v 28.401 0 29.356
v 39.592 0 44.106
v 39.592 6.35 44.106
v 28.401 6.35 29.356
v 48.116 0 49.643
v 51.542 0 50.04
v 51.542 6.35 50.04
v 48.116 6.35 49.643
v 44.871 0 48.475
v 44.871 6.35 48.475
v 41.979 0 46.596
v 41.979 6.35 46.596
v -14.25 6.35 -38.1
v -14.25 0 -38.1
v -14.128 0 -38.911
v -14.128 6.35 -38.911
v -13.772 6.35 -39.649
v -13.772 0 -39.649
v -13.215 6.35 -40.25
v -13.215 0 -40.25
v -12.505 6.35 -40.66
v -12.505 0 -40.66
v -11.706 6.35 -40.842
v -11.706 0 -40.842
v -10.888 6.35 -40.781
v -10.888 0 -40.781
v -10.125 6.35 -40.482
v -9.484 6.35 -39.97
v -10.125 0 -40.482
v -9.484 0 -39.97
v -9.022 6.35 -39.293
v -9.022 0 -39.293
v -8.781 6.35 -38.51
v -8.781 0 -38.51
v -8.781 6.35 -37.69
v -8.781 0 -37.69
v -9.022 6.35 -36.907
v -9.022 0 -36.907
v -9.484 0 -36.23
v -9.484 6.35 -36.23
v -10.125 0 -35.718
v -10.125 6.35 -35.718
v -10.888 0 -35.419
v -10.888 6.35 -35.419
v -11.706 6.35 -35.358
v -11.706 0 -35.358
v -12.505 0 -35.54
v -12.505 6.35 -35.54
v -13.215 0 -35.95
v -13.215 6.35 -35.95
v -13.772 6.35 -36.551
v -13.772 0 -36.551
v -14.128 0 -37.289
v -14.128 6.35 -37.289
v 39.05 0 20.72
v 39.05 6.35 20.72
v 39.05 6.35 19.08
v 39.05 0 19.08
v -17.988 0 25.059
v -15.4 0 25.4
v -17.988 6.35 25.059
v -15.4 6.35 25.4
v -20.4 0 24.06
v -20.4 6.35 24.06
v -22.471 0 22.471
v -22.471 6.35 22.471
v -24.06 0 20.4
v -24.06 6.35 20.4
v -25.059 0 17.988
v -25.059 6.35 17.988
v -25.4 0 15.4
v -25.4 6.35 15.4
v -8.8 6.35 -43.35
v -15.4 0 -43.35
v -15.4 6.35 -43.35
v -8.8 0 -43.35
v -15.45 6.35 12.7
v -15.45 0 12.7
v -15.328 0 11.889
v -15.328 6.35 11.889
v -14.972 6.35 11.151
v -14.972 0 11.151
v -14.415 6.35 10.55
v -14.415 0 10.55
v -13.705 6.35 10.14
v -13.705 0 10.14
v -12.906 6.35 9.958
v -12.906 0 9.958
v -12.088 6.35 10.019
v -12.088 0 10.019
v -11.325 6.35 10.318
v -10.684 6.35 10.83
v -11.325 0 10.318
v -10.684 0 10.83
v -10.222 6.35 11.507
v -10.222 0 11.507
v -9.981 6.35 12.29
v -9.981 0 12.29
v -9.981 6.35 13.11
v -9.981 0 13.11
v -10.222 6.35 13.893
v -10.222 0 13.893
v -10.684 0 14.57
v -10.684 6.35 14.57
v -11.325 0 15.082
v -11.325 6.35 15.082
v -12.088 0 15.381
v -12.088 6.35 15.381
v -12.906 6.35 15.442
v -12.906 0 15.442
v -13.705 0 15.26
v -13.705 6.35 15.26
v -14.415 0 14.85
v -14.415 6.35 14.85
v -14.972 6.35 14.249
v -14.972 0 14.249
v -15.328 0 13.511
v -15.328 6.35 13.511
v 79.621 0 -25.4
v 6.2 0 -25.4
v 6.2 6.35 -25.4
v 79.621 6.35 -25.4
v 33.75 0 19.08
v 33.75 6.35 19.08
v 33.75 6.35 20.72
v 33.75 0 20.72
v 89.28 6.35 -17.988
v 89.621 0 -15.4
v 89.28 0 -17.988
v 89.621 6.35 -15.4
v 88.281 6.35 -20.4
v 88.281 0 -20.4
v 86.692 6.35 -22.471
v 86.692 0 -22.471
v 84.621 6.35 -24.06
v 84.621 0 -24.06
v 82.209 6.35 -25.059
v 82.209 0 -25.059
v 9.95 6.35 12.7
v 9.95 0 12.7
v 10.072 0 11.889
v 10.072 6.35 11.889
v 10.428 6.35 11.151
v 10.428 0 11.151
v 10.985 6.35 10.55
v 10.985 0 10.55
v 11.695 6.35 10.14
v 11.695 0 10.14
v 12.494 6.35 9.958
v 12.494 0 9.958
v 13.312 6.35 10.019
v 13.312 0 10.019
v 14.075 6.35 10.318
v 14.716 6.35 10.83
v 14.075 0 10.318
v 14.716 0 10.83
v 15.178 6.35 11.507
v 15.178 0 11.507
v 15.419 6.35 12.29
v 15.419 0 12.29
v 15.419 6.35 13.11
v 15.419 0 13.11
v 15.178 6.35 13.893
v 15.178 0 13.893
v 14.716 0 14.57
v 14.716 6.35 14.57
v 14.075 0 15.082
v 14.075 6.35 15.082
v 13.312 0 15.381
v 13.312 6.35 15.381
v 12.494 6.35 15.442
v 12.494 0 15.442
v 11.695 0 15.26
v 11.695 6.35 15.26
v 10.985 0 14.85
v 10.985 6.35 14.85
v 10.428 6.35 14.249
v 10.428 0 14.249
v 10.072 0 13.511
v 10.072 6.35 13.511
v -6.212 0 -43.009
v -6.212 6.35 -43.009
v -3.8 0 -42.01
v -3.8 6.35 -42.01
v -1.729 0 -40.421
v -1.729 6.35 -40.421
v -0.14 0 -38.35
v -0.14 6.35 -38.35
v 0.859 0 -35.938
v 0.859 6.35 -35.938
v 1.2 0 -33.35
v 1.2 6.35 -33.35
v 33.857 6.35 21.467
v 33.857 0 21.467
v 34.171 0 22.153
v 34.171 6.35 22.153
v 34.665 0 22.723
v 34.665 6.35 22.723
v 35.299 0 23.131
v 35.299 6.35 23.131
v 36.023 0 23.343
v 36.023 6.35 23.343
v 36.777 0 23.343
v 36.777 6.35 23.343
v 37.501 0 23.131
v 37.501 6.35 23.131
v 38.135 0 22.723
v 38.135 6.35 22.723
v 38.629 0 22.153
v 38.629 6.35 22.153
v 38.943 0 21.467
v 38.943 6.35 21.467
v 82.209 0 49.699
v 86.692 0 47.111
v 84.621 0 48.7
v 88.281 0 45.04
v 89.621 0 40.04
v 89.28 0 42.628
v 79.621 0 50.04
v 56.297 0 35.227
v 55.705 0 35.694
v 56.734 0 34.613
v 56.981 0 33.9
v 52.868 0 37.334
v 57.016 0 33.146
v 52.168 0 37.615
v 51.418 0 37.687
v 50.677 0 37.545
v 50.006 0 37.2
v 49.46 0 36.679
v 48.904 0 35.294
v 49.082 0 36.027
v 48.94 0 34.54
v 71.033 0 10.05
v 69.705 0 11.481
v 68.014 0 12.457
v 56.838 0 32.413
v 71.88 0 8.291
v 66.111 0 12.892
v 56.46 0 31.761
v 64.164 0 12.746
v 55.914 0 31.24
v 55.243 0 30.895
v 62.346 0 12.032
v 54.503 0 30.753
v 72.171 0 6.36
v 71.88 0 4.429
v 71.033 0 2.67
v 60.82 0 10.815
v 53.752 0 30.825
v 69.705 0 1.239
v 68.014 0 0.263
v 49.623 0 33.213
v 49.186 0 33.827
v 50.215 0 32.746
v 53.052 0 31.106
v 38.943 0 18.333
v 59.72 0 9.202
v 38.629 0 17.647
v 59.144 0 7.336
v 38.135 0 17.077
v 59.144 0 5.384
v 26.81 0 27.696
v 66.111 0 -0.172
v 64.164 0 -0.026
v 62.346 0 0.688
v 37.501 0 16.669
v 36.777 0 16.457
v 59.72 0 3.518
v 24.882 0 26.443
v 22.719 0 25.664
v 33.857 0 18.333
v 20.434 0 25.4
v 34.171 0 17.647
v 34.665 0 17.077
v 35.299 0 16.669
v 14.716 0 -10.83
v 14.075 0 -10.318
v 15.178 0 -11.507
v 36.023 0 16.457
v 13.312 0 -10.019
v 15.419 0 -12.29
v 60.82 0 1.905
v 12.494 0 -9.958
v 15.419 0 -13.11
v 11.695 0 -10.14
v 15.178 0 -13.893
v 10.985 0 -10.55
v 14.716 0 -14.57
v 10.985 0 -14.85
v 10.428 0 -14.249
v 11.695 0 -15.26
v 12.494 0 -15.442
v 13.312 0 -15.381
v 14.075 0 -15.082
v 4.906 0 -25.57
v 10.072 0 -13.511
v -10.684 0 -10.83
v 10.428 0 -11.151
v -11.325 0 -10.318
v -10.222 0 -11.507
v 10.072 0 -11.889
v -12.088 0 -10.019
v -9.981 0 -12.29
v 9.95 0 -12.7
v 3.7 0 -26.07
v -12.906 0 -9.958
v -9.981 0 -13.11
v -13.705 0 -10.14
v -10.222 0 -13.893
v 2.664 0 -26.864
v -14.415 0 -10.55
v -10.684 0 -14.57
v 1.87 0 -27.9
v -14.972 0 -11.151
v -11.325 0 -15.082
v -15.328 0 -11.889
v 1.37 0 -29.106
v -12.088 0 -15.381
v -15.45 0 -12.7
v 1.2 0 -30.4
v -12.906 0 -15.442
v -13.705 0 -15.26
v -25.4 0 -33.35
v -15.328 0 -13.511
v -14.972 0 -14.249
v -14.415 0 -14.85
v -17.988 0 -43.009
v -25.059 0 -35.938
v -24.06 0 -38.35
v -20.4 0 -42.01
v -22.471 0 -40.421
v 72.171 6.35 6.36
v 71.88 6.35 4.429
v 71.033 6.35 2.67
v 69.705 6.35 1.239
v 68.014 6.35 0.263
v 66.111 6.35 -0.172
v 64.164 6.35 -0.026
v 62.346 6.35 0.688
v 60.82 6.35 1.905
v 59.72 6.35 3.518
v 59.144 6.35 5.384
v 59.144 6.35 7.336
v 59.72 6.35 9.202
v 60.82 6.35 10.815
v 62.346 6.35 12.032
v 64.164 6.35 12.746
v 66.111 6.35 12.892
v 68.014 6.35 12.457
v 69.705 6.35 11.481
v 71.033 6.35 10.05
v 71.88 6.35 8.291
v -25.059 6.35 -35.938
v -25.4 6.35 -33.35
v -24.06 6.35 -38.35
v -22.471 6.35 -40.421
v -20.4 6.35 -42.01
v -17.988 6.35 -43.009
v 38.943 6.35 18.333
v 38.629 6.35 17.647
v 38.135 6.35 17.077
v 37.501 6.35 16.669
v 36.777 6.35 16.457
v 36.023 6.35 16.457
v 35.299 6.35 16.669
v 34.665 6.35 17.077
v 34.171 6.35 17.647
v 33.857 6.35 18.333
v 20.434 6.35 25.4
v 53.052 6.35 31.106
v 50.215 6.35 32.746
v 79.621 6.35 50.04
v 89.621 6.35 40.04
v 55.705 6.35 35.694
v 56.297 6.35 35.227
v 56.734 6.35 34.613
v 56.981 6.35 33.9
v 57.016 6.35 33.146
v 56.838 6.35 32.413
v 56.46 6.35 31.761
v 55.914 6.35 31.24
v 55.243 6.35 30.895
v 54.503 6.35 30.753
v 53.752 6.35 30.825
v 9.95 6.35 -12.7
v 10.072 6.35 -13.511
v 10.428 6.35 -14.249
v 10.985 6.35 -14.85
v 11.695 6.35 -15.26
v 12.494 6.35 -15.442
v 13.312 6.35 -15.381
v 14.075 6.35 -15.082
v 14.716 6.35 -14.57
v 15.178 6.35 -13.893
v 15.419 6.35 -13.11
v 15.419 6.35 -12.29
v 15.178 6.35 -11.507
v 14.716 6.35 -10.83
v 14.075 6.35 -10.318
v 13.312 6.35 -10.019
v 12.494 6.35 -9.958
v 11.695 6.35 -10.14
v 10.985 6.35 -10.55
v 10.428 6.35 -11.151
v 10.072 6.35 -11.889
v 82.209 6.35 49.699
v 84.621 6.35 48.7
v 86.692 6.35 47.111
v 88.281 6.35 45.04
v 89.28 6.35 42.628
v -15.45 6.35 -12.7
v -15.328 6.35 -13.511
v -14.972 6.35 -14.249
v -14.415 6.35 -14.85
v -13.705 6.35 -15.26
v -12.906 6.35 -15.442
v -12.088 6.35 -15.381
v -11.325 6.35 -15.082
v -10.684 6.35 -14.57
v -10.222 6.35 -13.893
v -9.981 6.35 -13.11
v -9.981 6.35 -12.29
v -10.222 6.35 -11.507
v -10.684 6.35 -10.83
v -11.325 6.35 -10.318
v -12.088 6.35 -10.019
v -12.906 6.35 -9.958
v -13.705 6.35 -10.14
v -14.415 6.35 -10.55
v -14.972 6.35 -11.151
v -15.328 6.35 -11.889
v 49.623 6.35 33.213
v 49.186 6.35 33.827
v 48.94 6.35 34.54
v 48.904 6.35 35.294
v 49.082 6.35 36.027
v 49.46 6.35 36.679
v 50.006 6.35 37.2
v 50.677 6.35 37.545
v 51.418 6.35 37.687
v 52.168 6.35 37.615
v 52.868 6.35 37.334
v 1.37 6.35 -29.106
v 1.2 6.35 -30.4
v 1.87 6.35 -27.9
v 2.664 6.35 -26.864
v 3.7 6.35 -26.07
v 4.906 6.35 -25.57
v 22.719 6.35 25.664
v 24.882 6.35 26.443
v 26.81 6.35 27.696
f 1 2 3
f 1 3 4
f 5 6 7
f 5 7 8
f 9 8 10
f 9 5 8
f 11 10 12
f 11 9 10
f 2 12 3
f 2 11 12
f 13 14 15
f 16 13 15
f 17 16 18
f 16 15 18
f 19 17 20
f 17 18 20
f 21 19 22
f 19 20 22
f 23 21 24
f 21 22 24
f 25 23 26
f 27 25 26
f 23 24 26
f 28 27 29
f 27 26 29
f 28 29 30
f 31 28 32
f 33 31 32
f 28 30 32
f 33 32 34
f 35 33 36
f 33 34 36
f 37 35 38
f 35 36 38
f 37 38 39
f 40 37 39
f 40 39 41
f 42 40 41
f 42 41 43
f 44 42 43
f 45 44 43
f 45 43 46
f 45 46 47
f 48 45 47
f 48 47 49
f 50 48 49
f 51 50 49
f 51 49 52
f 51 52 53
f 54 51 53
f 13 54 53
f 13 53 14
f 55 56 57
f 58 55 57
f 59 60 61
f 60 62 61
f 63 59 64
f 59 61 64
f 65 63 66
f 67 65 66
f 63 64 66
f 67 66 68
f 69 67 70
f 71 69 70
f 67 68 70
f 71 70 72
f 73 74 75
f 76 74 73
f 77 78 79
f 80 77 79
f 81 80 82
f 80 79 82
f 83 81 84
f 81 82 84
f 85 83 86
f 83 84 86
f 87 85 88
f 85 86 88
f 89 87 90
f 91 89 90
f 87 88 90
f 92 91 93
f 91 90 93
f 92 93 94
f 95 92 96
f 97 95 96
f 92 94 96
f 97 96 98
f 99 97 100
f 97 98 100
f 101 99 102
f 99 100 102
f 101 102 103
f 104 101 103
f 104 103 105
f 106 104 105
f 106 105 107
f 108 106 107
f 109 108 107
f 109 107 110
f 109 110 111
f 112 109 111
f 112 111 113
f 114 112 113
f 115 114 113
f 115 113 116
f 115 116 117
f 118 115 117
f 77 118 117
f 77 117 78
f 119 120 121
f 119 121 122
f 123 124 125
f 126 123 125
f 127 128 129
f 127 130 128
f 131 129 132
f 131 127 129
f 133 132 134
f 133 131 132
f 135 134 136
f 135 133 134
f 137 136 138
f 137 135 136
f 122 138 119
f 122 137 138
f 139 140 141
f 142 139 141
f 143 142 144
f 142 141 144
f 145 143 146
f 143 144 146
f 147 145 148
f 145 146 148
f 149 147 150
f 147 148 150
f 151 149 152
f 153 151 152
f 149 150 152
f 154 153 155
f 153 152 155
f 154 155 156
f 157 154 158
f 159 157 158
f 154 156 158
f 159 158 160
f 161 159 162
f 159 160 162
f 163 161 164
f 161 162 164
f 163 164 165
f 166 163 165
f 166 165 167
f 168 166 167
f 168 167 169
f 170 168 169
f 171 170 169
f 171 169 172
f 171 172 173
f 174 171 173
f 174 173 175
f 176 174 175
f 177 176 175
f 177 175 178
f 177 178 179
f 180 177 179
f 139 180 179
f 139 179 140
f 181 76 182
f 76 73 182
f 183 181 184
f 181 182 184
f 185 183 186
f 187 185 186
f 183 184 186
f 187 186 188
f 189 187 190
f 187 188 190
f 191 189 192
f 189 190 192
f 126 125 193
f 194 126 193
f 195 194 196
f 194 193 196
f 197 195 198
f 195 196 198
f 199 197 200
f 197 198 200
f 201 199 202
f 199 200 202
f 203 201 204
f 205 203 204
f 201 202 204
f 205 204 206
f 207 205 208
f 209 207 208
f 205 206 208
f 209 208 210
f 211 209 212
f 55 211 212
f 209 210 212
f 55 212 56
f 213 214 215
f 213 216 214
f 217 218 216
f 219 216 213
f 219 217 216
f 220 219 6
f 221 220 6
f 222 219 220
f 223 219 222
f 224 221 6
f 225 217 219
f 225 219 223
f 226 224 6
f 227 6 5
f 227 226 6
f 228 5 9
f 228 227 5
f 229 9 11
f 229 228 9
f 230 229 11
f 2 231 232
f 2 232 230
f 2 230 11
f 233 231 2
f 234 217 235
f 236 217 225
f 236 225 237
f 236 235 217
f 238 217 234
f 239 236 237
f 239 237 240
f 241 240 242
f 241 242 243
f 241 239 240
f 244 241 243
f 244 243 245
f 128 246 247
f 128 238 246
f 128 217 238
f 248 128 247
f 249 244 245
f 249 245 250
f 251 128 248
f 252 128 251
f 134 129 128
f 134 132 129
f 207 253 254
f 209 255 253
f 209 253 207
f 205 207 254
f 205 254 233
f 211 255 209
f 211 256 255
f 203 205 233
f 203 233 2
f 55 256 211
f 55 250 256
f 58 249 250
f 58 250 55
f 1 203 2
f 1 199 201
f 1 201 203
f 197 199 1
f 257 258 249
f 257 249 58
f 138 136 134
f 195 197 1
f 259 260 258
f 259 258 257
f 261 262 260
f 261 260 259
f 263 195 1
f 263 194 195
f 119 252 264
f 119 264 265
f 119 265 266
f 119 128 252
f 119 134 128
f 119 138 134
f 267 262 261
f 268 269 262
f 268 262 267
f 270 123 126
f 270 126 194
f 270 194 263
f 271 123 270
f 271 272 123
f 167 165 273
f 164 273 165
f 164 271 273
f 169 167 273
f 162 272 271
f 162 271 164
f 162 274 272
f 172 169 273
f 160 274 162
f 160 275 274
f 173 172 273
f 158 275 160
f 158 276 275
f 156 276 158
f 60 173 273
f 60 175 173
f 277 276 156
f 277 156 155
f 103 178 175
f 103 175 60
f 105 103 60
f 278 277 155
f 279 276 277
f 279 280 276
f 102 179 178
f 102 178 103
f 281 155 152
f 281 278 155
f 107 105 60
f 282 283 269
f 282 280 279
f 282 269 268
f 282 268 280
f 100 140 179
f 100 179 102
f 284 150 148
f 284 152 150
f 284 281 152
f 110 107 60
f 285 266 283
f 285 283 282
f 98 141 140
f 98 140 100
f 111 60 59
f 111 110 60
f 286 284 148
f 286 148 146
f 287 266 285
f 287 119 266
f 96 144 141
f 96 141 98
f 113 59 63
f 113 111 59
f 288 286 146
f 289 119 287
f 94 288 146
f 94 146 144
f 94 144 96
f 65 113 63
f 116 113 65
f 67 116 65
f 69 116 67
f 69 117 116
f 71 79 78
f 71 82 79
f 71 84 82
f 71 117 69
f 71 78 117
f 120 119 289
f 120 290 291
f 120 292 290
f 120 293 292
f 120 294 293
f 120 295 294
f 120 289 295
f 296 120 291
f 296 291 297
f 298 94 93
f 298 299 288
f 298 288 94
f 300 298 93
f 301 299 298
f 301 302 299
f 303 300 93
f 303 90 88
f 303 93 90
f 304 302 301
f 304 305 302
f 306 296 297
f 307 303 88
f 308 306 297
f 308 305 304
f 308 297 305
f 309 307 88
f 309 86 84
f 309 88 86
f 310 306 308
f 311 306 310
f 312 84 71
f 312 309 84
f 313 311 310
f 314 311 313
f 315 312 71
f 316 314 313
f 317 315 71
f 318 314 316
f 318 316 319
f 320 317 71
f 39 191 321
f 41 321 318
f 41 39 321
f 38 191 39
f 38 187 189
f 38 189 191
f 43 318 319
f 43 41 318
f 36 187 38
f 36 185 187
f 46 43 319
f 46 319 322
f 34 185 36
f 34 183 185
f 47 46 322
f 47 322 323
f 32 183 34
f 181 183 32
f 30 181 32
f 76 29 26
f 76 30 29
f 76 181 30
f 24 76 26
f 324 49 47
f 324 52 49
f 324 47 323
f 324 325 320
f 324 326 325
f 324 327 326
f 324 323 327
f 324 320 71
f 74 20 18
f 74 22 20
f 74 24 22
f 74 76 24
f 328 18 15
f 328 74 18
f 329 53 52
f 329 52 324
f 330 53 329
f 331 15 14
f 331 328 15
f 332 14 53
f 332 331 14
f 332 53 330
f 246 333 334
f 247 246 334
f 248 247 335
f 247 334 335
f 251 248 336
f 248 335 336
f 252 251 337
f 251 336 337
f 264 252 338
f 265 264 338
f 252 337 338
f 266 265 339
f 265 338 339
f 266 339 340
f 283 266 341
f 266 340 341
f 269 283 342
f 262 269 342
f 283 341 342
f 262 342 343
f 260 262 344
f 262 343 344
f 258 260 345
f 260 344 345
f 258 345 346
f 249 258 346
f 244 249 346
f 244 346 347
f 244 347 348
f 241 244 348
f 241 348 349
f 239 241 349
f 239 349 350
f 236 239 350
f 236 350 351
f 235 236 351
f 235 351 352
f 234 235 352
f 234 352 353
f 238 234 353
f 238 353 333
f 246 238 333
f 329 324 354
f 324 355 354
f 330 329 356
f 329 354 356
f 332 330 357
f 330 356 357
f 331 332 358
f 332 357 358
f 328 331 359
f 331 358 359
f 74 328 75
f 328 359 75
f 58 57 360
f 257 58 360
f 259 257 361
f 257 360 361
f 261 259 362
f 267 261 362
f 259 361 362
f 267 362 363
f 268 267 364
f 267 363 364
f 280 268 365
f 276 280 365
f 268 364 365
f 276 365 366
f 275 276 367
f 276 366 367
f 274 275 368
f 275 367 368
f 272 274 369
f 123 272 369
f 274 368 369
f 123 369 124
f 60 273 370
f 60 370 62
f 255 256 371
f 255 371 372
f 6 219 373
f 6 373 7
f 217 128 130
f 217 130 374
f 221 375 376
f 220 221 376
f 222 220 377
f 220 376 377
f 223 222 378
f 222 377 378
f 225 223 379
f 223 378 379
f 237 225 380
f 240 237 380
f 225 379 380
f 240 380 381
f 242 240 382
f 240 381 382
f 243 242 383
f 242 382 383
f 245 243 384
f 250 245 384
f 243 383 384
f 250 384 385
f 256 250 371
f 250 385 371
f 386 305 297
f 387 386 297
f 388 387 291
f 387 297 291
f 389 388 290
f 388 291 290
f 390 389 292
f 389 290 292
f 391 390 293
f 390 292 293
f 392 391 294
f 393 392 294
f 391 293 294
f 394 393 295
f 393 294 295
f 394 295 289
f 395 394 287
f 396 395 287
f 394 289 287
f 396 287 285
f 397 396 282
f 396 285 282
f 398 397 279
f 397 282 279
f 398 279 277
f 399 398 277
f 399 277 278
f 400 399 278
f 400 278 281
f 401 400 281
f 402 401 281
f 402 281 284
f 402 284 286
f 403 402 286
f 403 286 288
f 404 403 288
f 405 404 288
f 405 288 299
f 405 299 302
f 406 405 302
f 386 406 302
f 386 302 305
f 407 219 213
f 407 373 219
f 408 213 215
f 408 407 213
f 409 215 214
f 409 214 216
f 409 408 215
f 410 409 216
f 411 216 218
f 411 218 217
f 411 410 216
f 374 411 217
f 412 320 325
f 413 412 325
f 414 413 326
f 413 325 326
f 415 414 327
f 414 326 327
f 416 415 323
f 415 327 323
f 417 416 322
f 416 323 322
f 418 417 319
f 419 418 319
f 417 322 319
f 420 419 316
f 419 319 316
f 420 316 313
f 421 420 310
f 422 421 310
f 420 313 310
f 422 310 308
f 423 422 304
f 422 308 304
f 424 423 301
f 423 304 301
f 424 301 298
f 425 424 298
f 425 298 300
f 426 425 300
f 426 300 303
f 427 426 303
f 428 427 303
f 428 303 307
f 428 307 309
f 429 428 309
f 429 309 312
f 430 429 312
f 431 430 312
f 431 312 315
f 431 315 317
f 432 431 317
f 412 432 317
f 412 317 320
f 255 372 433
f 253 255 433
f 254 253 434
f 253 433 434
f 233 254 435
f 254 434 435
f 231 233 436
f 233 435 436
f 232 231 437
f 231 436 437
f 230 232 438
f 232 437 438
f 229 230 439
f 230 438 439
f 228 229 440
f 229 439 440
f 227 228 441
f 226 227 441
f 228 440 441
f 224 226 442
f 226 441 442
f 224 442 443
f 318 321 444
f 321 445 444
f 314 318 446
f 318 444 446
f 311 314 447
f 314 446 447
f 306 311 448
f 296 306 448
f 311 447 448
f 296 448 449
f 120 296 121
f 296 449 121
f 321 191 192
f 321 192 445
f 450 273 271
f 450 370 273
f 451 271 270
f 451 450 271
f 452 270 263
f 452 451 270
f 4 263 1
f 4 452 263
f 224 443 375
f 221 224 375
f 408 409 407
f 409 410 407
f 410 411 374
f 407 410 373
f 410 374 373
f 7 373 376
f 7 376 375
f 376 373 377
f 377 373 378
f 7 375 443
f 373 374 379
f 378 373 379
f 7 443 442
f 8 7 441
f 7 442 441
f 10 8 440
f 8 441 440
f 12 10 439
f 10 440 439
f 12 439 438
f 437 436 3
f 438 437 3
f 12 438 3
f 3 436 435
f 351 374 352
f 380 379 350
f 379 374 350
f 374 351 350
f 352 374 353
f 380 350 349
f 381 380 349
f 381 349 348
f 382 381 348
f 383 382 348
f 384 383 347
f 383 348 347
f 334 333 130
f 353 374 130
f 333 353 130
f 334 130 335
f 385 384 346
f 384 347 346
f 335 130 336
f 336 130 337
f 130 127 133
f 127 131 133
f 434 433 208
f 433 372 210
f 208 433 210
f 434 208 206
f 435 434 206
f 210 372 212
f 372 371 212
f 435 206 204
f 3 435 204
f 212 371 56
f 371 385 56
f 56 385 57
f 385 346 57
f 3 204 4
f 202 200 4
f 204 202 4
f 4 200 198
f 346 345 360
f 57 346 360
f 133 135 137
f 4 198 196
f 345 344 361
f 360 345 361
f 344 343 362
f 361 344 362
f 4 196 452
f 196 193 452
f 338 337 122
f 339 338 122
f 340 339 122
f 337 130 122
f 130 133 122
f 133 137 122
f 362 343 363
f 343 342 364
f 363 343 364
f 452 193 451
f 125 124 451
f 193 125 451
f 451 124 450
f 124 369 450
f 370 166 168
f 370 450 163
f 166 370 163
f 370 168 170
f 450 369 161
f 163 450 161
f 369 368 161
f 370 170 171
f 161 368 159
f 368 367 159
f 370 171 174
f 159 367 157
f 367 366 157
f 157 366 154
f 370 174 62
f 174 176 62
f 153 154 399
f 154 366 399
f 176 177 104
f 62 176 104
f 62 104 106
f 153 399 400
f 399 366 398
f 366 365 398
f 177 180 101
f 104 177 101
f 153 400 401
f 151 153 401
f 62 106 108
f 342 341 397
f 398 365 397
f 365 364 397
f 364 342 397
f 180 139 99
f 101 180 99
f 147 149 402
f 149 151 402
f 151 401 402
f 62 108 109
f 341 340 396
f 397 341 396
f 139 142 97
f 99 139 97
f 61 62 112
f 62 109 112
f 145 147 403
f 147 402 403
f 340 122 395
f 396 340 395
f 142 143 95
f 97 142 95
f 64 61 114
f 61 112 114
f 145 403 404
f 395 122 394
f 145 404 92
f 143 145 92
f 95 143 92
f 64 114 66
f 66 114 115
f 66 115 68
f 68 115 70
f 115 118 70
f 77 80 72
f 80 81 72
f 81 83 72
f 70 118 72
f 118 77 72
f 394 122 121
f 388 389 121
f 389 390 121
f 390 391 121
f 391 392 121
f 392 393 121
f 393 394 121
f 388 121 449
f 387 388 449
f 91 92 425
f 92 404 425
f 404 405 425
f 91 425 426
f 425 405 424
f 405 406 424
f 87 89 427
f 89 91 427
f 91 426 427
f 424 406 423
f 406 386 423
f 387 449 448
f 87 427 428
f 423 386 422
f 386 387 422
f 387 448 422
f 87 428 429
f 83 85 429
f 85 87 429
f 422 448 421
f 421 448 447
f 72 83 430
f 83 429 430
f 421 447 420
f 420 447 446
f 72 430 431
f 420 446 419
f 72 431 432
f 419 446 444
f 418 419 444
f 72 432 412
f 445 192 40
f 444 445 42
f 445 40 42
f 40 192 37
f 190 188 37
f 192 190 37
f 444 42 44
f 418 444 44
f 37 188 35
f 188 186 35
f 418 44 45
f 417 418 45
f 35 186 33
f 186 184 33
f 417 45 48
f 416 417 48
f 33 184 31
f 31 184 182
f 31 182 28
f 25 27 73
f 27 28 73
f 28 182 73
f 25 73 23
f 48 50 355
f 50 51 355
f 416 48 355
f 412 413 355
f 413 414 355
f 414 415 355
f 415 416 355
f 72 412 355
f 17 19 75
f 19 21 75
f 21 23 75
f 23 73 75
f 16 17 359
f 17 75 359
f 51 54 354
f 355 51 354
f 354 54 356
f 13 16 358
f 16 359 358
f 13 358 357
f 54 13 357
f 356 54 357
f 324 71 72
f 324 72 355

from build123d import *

# Parameters (mm, degrees)
BOSS_EXTRUDE1_DEPTH  = 6.35
M5_CLEARANCE_HOLE1_D = 5.5
CUT_EXTRUDE2_DEPTH   = 7.35
FILLET1_R            = 10
SKETCH10_R           = 6.55
CUT_EXTRUDE3_DEPTH   = 7.35
FILLET2_R            = 5


with BuildPart() as part:
    # Sketch1 → Boss-Extrude1 (new body)
    with BuildSketch(Plane(origin=(0, 0, 0), x_dir=(1, 0, 0), z_dir=(0, 1, 0))):
        with BuildLine():
            Line((25.4, -25.4), (-25.4, -25.4))
            Line((-25.4, -25.4), (-25.4, 25.4))
            Line((-25.4, 25.4), (-25.4, 43.35))
            Line((-25.4, 43.35), (1.2, 43.35))
            Line((1.2, 43.35), (1.2, 25.4))
            Line((1.2, 25.4), (25.4, 25.4))
            Line((25.4, 25.4), (89.621209859, 25.4))
            Line((89.621209859, 25.4), (89.621209859, -50.04))
            Line((89.621209859, -50.04), (51.541941751, -50.04))
            ThreePointArc((51.541941751, -50.04), (44.870841587, -48.474895705), (39.591870426, -44.10618968))
            Line((39.591870426, -44.10618968), (25.4, -25.4))
        make_face()
    extrude(amount=BOSS_EXTRUDE1_DEPTH)

    # M5 Clearance Hole1 (through all)
    with Locations(Plane(origin=(0, 6.35, 0), x_dir=(1, 0, 0), z_dir=(0, 1, 0))):
        with Locations((-12.7, 12.7), (12.7, 12.7), (12.7, -12.7), (-12.7, -12.7), (-11.5, 38.1)):
            Hole(M5_CLEARANCE_HOLE1_D / 2)

    # Sketch7 → Cut-Extrude2 (cut, through all)
    with BuildSketch(Plane(origin=(0, 6.35, 0), x_dir=(1, 0, 0), z_dir=(0, 1, 0))):
        with BuildLine():
            Line((53.051764766, -31.105892862), (50.215452987, -32.745892862))
            ThreePointArc((50.215452987, -32.745892862), (49.247834614, -36.366488764), (52.868430515, -37.334107138))
            Line((52.868430515, -37.334107138), (55.704742294, -35.694107138))
            ThreePointArc((55.704742294, -35.694107138), (56.672360668, -32.073511236), (53.051764766, -31.105892862))
        make_face()
        with BuildLine():
            Line((33.75, -19.08), (33.75, -20.72))
            ThreePointArc((33.75, -20.72), (36.4, -23.37), (39.05, -20.72))
            Line((39.05, -20.72), (39.05, -19.08))
            ThreePointArc((39.05, -19.08), (36.4, -16.43), (33.75, -19.08))
        make_face()
    extrude(amount=-CUT_EXTRUDE2_DEPTH, mode=Mode.SUBTRACT)

    # Fillet1
    fillet1_edges = [part.edges().sort_by_distance(p)[0] for p in [
        (-25.4, 3.175, -43.35),
        (1.2, 3.175, -43.35),
        (89.621209859, 3.175, -25.4),
        (89.621209859, 3.175, 50.04),
        (25.4, 3.175, 25.4),
        (-25.4, 3.175, 25.4),
    ]]
    fillet(fillet1_edges, radius=FILLET1_R)

    # Sketch10 → Cut-Extrude3 (cut, through all)
    with BuildSketch(Plane(origin=(0, 6.35, 0), x_dir=(1, 0, 0), z_dir=(0, 1, 0))):
        with Locations((65.621209859, -6.36)):
            Circle(SKETCH10_R)
    extrude(amount=-CUT_EXTRUDE3_DEPTH, mode=Mode.SUBTRACT)

    # Fillet2
    fillet2_edges = [part.edges().sort_by_distance(p)[0] for p in [
        (1.2, 3.175, -25.4),
    ]]
    fillet(fillet2_edges, radius=FILLET2_R)


solid = part.part
